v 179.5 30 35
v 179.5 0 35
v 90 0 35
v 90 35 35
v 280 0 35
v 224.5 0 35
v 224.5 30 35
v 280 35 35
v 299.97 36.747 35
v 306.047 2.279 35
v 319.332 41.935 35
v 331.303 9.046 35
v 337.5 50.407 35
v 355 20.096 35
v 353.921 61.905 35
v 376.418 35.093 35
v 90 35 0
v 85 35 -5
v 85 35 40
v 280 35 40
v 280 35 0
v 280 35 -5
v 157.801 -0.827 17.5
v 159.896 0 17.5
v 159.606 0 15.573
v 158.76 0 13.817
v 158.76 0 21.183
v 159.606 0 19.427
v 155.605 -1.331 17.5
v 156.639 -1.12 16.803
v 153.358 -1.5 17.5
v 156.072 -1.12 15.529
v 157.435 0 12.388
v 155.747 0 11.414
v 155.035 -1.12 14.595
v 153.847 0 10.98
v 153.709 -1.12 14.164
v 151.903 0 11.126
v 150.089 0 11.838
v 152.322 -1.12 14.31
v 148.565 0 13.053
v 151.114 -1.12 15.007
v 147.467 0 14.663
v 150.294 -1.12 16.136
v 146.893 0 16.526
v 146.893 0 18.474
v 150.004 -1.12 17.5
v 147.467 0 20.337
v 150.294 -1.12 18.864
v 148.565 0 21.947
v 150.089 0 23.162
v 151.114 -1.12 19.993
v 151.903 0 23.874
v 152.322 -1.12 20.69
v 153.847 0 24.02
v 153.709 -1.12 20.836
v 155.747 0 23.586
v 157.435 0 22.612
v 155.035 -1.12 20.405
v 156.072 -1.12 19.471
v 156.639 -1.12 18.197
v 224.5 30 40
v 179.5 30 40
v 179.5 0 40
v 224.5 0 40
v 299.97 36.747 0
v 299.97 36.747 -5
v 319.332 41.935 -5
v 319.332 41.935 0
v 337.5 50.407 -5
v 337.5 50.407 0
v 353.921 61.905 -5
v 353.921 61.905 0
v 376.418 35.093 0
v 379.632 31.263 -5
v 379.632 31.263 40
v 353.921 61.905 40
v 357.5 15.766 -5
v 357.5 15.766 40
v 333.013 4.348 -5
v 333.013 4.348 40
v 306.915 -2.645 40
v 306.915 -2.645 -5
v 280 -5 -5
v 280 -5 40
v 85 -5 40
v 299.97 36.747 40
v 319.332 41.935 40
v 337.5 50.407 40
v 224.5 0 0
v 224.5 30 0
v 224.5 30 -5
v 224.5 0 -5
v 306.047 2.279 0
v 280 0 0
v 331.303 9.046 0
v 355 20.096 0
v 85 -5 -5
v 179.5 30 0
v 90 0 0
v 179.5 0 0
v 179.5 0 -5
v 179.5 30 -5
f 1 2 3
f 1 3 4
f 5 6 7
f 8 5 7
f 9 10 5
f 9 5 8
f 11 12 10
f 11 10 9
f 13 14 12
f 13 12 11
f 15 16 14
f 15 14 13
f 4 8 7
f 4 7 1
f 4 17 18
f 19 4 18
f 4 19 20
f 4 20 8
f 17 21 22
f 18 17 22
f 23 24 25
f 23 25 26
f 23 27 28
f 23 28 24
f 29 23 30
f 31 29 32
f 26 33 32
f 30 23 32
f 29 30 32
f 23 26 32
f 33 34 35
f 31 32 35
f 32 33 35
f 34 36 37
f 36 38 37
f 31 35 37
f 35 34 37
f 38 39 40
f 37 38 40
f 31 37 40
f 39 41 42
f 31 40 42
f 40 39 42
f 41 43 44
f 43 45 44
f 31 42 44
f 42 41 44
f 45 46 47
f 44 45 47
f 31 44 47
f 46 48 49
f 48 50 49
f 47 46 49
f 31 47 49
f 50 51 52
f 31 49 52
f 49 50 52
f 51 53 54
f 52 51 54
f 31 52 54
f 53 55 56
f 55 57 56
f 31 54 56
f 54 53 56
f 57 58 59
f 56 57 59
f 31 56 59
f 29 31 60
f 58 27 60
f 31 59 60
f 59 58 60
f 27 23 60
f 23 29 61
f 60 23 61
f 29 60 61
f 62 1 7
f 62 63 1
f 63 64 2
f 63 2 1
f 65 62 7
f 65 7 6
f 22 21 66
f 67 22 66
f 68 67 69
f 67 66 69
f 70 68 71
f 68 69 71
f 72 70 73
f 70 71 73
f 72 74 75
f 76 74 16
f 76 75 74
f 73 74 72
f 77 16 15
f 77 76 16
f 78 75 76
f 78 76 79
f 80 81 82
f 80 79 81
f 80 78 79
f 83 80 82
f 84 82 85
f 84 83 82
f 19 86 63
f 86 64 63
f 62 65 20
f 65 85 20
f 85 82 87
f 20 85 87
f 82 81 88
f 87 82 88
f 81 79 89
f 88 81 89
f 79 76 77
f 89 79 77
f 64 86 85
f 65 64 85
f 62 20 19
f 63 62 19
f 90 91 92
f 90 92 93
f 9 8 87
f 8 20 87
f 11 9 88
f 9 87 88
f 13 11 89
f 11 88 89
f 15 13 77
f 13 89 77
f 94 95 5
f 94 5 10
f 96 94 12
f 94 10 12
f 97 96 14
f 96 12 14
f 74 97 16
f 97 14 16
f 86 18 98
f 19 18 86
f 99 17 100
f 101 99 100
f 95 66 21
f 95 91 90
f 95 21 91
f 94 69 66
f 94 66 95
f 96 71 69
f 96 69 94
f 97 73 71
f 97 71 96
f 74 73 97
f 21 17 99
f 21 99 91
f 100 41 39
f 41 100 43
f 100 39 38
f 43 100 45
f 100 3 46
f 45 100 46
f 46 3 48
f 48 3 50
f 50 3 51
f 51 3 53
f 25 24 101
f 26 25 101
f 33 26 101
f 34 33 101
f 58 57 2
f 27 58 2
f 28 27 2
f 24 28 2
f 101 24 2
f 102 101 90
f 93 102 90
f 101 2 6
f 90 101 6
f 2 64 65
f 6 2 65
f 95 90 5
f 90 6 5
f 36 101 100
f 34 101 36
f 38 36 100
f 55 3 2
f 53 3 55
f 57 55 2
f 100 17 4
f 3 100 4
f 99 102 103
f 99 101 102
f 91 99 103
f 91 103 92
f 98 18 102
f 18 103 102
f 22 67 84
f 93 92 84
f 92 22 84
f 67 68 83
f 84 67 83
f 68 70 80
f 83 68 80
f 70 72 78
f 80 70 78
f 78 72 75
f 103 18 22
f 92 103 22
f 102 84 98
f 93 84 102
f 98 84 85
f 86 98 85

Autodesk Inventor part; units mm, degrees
ref_plane "YZ Plane" through (0, 0, 0) normal (1, 0, 0) x (0, 1, 0)
ref_plane "XZ Plane" through (0, 0, 0) normal (0, 1, 0) x (-1, 0, 0)
ref_plane "XY Plane" through (0, 0, 0) normal (0, 0, 1) x (1, 0, 0)
sketch "Sketch1" plane through (0, 0, 0) normal (0, 0, 1) x (1, 0, 0)
  line L0 (90, 0) -> (280, 0)
  arc A0 (280, 0) -> (376.4181, 35.0933) centre (280, 150) ccw
  line L1 (280, 0) -> (376.4181, 35.0933) construction
  line L2 (0, 0) -> (0, 82.2351) construction
  dimension "d0" = 150
  dimension "d4" = 20
  dimension "d6" = 280
  dimension "d19" = 173.0413
  dimension "d64" = 90
ref_plane "Work Plane1" through (0, 0, 0) normal (1, 0, 0) x (0, 1, 0)
sketch "Sketch2" plane through (0, 0, 0) normal (1, 0, 0) x (0, 1, 0)
  line L0 (0, 0) -> (35, 0)
  line L1 (35, 35) -> (0, 35)
  line L2 (0, 35) -> (0, 0)
  line L3 (35, -5) -> (-5, -5)
  line L4 (-5, -5) -> (-5, 40)
  line L5 (-5, 40) -> (35, 40)
  line L6 (35, -5) -> (35, 0)
  line L7 (35, 35) -> (35, 40)
  dimension "d7" = 35
  dimension "d11" = 35
  dimension "d12" = 90
  dimension "d13" = 35
  dimension "d14" = 40
  dimension "d15" = 45
  dimension "d16" = 35
ref_plane "Work Plane4" through (0, -5, 40) normal (0, 0, 1) x (1, 0, 0)
sketch "Sketch3" plane through (0, -5, 40) normal (0, 0, 1) x (1, 0, 0)
  line L0 (179.5, 0) -> (179.5, 40)
  line L1 (179.5, 40) -> (224.5, 40)
  line L2 (224.5, 40) -> (224.5, 0)
  line L3 (224.5, 0) -> (179.5, 0)
  line L4 (179.5, 5) -> (224.5, 5)
  line L5 (179.5, 35) -> (224.5, 35)
  point P0 (0, 5)
  point P1 (0, 0)
  dimension "d20" = 45
  dimension "d21" = 179.5
  dimension "d65" = 40
  dimension "d66" = 30
  dimension "d67" = 5
  dimension "d68" = 30
ref_plane "Work Plane6" through (0, 0, 35) normal (0, 1, 0) x (1, 0, 0)
sketch "Sketch4" plane through (0, 0, 35) normal (0, 1, 0) x (1, 0, 0)
  point P0 (0, 35)
ref_plane "Work Plane2" through (224.5, 0, 17.5) normal (0, 0, 1) x (1, 0, 0)
sketch "Sketch5" plane through (224.5, 0, 17.5) normal (0, 0, 1) x (1, 0, 0)
  arc A0 (-77.6803, 0) -> (-64.6037, 0) centre (-71.142, 13.5) ccw
  line L0 (-224.5, 0) -> (-35.51, 0) projected
  line L1 (-224.5, -5) -> (-224.5, 30) projected
  line L2 (-77.6803, 0) -> (-64.6037, 0)
  line L3 (-71.142, -1.5) -> (-71.142, 0)
  dimension "d44" = 30
  dimension "d45" = 13.5
  dimension "d46" = 153.358
ref_plane "Work Plane7" through (0, 0, 35) normal (0, 1, 0) x (1, 0, 0)
ref_plane "Work Plane5" through (5, 35, 40) normal (0, 1, 0) x (1, 0, 0)
ref_plane "Work Plane3" through (90, 0, 0) normal (1, 0, 0) x (0, 1, 0)
sketch "Sketch8" plane through (90, 0, 0) normal (1, 0, 0) x (0, 1, 0)
  line L0 (31.2631, -5) -> (-5, -5) projected
  line L1 (35, -5) -> (-5, -5)
  line L2 (-5, -5) -> (-5, 40)
  line L3 (-5, 40) -> (35, 40)
  line L4 (35, 40) -> (35, 35)
  line L5 (35, 35) -> (0, 35)
  line L6 (0, 35) -> (0, 0)
  line L7 (0, 0) -> (35, 0)
  line L8 (35, 0) -> (35, -5)
  dimension "d59" = 45
  dimension "d60" = 40
sweep "Sweep3" add profiles "Sketch8" path "Sketch1"
extrude "Extrusion5" cut sketch "Sketch3" against normal through all contours L0 L5 L2 L4
revolve "Revolution2" cut sketch "Sketch5" angle 360 about axis through (153.358, -1.5, 17.5) along (0, 1, 0) picked at (-67.4817, -0.2757) contours L3 L0 A0
sketch "Sketch9" plane through (90, -5, -5) normal (-1, 0, 0) x (0, 0, 1)
  line L0 (0, 40) -> (0, 0)
  line L1 (0, 0) -> (45, 0)
  line L2 (45, 0) -> (45, 40)
  line L3 (45, 40) -> (40, 40)
  line L4 (40, 40) -> (0, 40)
  point P0 (5, 5)
  dimension "d74" = 45
  dimension "d75" = 5
extrude "Extrusion6" add sketch "Sketch9" along normal blind 5
properties part number "Shooting Ramp"
